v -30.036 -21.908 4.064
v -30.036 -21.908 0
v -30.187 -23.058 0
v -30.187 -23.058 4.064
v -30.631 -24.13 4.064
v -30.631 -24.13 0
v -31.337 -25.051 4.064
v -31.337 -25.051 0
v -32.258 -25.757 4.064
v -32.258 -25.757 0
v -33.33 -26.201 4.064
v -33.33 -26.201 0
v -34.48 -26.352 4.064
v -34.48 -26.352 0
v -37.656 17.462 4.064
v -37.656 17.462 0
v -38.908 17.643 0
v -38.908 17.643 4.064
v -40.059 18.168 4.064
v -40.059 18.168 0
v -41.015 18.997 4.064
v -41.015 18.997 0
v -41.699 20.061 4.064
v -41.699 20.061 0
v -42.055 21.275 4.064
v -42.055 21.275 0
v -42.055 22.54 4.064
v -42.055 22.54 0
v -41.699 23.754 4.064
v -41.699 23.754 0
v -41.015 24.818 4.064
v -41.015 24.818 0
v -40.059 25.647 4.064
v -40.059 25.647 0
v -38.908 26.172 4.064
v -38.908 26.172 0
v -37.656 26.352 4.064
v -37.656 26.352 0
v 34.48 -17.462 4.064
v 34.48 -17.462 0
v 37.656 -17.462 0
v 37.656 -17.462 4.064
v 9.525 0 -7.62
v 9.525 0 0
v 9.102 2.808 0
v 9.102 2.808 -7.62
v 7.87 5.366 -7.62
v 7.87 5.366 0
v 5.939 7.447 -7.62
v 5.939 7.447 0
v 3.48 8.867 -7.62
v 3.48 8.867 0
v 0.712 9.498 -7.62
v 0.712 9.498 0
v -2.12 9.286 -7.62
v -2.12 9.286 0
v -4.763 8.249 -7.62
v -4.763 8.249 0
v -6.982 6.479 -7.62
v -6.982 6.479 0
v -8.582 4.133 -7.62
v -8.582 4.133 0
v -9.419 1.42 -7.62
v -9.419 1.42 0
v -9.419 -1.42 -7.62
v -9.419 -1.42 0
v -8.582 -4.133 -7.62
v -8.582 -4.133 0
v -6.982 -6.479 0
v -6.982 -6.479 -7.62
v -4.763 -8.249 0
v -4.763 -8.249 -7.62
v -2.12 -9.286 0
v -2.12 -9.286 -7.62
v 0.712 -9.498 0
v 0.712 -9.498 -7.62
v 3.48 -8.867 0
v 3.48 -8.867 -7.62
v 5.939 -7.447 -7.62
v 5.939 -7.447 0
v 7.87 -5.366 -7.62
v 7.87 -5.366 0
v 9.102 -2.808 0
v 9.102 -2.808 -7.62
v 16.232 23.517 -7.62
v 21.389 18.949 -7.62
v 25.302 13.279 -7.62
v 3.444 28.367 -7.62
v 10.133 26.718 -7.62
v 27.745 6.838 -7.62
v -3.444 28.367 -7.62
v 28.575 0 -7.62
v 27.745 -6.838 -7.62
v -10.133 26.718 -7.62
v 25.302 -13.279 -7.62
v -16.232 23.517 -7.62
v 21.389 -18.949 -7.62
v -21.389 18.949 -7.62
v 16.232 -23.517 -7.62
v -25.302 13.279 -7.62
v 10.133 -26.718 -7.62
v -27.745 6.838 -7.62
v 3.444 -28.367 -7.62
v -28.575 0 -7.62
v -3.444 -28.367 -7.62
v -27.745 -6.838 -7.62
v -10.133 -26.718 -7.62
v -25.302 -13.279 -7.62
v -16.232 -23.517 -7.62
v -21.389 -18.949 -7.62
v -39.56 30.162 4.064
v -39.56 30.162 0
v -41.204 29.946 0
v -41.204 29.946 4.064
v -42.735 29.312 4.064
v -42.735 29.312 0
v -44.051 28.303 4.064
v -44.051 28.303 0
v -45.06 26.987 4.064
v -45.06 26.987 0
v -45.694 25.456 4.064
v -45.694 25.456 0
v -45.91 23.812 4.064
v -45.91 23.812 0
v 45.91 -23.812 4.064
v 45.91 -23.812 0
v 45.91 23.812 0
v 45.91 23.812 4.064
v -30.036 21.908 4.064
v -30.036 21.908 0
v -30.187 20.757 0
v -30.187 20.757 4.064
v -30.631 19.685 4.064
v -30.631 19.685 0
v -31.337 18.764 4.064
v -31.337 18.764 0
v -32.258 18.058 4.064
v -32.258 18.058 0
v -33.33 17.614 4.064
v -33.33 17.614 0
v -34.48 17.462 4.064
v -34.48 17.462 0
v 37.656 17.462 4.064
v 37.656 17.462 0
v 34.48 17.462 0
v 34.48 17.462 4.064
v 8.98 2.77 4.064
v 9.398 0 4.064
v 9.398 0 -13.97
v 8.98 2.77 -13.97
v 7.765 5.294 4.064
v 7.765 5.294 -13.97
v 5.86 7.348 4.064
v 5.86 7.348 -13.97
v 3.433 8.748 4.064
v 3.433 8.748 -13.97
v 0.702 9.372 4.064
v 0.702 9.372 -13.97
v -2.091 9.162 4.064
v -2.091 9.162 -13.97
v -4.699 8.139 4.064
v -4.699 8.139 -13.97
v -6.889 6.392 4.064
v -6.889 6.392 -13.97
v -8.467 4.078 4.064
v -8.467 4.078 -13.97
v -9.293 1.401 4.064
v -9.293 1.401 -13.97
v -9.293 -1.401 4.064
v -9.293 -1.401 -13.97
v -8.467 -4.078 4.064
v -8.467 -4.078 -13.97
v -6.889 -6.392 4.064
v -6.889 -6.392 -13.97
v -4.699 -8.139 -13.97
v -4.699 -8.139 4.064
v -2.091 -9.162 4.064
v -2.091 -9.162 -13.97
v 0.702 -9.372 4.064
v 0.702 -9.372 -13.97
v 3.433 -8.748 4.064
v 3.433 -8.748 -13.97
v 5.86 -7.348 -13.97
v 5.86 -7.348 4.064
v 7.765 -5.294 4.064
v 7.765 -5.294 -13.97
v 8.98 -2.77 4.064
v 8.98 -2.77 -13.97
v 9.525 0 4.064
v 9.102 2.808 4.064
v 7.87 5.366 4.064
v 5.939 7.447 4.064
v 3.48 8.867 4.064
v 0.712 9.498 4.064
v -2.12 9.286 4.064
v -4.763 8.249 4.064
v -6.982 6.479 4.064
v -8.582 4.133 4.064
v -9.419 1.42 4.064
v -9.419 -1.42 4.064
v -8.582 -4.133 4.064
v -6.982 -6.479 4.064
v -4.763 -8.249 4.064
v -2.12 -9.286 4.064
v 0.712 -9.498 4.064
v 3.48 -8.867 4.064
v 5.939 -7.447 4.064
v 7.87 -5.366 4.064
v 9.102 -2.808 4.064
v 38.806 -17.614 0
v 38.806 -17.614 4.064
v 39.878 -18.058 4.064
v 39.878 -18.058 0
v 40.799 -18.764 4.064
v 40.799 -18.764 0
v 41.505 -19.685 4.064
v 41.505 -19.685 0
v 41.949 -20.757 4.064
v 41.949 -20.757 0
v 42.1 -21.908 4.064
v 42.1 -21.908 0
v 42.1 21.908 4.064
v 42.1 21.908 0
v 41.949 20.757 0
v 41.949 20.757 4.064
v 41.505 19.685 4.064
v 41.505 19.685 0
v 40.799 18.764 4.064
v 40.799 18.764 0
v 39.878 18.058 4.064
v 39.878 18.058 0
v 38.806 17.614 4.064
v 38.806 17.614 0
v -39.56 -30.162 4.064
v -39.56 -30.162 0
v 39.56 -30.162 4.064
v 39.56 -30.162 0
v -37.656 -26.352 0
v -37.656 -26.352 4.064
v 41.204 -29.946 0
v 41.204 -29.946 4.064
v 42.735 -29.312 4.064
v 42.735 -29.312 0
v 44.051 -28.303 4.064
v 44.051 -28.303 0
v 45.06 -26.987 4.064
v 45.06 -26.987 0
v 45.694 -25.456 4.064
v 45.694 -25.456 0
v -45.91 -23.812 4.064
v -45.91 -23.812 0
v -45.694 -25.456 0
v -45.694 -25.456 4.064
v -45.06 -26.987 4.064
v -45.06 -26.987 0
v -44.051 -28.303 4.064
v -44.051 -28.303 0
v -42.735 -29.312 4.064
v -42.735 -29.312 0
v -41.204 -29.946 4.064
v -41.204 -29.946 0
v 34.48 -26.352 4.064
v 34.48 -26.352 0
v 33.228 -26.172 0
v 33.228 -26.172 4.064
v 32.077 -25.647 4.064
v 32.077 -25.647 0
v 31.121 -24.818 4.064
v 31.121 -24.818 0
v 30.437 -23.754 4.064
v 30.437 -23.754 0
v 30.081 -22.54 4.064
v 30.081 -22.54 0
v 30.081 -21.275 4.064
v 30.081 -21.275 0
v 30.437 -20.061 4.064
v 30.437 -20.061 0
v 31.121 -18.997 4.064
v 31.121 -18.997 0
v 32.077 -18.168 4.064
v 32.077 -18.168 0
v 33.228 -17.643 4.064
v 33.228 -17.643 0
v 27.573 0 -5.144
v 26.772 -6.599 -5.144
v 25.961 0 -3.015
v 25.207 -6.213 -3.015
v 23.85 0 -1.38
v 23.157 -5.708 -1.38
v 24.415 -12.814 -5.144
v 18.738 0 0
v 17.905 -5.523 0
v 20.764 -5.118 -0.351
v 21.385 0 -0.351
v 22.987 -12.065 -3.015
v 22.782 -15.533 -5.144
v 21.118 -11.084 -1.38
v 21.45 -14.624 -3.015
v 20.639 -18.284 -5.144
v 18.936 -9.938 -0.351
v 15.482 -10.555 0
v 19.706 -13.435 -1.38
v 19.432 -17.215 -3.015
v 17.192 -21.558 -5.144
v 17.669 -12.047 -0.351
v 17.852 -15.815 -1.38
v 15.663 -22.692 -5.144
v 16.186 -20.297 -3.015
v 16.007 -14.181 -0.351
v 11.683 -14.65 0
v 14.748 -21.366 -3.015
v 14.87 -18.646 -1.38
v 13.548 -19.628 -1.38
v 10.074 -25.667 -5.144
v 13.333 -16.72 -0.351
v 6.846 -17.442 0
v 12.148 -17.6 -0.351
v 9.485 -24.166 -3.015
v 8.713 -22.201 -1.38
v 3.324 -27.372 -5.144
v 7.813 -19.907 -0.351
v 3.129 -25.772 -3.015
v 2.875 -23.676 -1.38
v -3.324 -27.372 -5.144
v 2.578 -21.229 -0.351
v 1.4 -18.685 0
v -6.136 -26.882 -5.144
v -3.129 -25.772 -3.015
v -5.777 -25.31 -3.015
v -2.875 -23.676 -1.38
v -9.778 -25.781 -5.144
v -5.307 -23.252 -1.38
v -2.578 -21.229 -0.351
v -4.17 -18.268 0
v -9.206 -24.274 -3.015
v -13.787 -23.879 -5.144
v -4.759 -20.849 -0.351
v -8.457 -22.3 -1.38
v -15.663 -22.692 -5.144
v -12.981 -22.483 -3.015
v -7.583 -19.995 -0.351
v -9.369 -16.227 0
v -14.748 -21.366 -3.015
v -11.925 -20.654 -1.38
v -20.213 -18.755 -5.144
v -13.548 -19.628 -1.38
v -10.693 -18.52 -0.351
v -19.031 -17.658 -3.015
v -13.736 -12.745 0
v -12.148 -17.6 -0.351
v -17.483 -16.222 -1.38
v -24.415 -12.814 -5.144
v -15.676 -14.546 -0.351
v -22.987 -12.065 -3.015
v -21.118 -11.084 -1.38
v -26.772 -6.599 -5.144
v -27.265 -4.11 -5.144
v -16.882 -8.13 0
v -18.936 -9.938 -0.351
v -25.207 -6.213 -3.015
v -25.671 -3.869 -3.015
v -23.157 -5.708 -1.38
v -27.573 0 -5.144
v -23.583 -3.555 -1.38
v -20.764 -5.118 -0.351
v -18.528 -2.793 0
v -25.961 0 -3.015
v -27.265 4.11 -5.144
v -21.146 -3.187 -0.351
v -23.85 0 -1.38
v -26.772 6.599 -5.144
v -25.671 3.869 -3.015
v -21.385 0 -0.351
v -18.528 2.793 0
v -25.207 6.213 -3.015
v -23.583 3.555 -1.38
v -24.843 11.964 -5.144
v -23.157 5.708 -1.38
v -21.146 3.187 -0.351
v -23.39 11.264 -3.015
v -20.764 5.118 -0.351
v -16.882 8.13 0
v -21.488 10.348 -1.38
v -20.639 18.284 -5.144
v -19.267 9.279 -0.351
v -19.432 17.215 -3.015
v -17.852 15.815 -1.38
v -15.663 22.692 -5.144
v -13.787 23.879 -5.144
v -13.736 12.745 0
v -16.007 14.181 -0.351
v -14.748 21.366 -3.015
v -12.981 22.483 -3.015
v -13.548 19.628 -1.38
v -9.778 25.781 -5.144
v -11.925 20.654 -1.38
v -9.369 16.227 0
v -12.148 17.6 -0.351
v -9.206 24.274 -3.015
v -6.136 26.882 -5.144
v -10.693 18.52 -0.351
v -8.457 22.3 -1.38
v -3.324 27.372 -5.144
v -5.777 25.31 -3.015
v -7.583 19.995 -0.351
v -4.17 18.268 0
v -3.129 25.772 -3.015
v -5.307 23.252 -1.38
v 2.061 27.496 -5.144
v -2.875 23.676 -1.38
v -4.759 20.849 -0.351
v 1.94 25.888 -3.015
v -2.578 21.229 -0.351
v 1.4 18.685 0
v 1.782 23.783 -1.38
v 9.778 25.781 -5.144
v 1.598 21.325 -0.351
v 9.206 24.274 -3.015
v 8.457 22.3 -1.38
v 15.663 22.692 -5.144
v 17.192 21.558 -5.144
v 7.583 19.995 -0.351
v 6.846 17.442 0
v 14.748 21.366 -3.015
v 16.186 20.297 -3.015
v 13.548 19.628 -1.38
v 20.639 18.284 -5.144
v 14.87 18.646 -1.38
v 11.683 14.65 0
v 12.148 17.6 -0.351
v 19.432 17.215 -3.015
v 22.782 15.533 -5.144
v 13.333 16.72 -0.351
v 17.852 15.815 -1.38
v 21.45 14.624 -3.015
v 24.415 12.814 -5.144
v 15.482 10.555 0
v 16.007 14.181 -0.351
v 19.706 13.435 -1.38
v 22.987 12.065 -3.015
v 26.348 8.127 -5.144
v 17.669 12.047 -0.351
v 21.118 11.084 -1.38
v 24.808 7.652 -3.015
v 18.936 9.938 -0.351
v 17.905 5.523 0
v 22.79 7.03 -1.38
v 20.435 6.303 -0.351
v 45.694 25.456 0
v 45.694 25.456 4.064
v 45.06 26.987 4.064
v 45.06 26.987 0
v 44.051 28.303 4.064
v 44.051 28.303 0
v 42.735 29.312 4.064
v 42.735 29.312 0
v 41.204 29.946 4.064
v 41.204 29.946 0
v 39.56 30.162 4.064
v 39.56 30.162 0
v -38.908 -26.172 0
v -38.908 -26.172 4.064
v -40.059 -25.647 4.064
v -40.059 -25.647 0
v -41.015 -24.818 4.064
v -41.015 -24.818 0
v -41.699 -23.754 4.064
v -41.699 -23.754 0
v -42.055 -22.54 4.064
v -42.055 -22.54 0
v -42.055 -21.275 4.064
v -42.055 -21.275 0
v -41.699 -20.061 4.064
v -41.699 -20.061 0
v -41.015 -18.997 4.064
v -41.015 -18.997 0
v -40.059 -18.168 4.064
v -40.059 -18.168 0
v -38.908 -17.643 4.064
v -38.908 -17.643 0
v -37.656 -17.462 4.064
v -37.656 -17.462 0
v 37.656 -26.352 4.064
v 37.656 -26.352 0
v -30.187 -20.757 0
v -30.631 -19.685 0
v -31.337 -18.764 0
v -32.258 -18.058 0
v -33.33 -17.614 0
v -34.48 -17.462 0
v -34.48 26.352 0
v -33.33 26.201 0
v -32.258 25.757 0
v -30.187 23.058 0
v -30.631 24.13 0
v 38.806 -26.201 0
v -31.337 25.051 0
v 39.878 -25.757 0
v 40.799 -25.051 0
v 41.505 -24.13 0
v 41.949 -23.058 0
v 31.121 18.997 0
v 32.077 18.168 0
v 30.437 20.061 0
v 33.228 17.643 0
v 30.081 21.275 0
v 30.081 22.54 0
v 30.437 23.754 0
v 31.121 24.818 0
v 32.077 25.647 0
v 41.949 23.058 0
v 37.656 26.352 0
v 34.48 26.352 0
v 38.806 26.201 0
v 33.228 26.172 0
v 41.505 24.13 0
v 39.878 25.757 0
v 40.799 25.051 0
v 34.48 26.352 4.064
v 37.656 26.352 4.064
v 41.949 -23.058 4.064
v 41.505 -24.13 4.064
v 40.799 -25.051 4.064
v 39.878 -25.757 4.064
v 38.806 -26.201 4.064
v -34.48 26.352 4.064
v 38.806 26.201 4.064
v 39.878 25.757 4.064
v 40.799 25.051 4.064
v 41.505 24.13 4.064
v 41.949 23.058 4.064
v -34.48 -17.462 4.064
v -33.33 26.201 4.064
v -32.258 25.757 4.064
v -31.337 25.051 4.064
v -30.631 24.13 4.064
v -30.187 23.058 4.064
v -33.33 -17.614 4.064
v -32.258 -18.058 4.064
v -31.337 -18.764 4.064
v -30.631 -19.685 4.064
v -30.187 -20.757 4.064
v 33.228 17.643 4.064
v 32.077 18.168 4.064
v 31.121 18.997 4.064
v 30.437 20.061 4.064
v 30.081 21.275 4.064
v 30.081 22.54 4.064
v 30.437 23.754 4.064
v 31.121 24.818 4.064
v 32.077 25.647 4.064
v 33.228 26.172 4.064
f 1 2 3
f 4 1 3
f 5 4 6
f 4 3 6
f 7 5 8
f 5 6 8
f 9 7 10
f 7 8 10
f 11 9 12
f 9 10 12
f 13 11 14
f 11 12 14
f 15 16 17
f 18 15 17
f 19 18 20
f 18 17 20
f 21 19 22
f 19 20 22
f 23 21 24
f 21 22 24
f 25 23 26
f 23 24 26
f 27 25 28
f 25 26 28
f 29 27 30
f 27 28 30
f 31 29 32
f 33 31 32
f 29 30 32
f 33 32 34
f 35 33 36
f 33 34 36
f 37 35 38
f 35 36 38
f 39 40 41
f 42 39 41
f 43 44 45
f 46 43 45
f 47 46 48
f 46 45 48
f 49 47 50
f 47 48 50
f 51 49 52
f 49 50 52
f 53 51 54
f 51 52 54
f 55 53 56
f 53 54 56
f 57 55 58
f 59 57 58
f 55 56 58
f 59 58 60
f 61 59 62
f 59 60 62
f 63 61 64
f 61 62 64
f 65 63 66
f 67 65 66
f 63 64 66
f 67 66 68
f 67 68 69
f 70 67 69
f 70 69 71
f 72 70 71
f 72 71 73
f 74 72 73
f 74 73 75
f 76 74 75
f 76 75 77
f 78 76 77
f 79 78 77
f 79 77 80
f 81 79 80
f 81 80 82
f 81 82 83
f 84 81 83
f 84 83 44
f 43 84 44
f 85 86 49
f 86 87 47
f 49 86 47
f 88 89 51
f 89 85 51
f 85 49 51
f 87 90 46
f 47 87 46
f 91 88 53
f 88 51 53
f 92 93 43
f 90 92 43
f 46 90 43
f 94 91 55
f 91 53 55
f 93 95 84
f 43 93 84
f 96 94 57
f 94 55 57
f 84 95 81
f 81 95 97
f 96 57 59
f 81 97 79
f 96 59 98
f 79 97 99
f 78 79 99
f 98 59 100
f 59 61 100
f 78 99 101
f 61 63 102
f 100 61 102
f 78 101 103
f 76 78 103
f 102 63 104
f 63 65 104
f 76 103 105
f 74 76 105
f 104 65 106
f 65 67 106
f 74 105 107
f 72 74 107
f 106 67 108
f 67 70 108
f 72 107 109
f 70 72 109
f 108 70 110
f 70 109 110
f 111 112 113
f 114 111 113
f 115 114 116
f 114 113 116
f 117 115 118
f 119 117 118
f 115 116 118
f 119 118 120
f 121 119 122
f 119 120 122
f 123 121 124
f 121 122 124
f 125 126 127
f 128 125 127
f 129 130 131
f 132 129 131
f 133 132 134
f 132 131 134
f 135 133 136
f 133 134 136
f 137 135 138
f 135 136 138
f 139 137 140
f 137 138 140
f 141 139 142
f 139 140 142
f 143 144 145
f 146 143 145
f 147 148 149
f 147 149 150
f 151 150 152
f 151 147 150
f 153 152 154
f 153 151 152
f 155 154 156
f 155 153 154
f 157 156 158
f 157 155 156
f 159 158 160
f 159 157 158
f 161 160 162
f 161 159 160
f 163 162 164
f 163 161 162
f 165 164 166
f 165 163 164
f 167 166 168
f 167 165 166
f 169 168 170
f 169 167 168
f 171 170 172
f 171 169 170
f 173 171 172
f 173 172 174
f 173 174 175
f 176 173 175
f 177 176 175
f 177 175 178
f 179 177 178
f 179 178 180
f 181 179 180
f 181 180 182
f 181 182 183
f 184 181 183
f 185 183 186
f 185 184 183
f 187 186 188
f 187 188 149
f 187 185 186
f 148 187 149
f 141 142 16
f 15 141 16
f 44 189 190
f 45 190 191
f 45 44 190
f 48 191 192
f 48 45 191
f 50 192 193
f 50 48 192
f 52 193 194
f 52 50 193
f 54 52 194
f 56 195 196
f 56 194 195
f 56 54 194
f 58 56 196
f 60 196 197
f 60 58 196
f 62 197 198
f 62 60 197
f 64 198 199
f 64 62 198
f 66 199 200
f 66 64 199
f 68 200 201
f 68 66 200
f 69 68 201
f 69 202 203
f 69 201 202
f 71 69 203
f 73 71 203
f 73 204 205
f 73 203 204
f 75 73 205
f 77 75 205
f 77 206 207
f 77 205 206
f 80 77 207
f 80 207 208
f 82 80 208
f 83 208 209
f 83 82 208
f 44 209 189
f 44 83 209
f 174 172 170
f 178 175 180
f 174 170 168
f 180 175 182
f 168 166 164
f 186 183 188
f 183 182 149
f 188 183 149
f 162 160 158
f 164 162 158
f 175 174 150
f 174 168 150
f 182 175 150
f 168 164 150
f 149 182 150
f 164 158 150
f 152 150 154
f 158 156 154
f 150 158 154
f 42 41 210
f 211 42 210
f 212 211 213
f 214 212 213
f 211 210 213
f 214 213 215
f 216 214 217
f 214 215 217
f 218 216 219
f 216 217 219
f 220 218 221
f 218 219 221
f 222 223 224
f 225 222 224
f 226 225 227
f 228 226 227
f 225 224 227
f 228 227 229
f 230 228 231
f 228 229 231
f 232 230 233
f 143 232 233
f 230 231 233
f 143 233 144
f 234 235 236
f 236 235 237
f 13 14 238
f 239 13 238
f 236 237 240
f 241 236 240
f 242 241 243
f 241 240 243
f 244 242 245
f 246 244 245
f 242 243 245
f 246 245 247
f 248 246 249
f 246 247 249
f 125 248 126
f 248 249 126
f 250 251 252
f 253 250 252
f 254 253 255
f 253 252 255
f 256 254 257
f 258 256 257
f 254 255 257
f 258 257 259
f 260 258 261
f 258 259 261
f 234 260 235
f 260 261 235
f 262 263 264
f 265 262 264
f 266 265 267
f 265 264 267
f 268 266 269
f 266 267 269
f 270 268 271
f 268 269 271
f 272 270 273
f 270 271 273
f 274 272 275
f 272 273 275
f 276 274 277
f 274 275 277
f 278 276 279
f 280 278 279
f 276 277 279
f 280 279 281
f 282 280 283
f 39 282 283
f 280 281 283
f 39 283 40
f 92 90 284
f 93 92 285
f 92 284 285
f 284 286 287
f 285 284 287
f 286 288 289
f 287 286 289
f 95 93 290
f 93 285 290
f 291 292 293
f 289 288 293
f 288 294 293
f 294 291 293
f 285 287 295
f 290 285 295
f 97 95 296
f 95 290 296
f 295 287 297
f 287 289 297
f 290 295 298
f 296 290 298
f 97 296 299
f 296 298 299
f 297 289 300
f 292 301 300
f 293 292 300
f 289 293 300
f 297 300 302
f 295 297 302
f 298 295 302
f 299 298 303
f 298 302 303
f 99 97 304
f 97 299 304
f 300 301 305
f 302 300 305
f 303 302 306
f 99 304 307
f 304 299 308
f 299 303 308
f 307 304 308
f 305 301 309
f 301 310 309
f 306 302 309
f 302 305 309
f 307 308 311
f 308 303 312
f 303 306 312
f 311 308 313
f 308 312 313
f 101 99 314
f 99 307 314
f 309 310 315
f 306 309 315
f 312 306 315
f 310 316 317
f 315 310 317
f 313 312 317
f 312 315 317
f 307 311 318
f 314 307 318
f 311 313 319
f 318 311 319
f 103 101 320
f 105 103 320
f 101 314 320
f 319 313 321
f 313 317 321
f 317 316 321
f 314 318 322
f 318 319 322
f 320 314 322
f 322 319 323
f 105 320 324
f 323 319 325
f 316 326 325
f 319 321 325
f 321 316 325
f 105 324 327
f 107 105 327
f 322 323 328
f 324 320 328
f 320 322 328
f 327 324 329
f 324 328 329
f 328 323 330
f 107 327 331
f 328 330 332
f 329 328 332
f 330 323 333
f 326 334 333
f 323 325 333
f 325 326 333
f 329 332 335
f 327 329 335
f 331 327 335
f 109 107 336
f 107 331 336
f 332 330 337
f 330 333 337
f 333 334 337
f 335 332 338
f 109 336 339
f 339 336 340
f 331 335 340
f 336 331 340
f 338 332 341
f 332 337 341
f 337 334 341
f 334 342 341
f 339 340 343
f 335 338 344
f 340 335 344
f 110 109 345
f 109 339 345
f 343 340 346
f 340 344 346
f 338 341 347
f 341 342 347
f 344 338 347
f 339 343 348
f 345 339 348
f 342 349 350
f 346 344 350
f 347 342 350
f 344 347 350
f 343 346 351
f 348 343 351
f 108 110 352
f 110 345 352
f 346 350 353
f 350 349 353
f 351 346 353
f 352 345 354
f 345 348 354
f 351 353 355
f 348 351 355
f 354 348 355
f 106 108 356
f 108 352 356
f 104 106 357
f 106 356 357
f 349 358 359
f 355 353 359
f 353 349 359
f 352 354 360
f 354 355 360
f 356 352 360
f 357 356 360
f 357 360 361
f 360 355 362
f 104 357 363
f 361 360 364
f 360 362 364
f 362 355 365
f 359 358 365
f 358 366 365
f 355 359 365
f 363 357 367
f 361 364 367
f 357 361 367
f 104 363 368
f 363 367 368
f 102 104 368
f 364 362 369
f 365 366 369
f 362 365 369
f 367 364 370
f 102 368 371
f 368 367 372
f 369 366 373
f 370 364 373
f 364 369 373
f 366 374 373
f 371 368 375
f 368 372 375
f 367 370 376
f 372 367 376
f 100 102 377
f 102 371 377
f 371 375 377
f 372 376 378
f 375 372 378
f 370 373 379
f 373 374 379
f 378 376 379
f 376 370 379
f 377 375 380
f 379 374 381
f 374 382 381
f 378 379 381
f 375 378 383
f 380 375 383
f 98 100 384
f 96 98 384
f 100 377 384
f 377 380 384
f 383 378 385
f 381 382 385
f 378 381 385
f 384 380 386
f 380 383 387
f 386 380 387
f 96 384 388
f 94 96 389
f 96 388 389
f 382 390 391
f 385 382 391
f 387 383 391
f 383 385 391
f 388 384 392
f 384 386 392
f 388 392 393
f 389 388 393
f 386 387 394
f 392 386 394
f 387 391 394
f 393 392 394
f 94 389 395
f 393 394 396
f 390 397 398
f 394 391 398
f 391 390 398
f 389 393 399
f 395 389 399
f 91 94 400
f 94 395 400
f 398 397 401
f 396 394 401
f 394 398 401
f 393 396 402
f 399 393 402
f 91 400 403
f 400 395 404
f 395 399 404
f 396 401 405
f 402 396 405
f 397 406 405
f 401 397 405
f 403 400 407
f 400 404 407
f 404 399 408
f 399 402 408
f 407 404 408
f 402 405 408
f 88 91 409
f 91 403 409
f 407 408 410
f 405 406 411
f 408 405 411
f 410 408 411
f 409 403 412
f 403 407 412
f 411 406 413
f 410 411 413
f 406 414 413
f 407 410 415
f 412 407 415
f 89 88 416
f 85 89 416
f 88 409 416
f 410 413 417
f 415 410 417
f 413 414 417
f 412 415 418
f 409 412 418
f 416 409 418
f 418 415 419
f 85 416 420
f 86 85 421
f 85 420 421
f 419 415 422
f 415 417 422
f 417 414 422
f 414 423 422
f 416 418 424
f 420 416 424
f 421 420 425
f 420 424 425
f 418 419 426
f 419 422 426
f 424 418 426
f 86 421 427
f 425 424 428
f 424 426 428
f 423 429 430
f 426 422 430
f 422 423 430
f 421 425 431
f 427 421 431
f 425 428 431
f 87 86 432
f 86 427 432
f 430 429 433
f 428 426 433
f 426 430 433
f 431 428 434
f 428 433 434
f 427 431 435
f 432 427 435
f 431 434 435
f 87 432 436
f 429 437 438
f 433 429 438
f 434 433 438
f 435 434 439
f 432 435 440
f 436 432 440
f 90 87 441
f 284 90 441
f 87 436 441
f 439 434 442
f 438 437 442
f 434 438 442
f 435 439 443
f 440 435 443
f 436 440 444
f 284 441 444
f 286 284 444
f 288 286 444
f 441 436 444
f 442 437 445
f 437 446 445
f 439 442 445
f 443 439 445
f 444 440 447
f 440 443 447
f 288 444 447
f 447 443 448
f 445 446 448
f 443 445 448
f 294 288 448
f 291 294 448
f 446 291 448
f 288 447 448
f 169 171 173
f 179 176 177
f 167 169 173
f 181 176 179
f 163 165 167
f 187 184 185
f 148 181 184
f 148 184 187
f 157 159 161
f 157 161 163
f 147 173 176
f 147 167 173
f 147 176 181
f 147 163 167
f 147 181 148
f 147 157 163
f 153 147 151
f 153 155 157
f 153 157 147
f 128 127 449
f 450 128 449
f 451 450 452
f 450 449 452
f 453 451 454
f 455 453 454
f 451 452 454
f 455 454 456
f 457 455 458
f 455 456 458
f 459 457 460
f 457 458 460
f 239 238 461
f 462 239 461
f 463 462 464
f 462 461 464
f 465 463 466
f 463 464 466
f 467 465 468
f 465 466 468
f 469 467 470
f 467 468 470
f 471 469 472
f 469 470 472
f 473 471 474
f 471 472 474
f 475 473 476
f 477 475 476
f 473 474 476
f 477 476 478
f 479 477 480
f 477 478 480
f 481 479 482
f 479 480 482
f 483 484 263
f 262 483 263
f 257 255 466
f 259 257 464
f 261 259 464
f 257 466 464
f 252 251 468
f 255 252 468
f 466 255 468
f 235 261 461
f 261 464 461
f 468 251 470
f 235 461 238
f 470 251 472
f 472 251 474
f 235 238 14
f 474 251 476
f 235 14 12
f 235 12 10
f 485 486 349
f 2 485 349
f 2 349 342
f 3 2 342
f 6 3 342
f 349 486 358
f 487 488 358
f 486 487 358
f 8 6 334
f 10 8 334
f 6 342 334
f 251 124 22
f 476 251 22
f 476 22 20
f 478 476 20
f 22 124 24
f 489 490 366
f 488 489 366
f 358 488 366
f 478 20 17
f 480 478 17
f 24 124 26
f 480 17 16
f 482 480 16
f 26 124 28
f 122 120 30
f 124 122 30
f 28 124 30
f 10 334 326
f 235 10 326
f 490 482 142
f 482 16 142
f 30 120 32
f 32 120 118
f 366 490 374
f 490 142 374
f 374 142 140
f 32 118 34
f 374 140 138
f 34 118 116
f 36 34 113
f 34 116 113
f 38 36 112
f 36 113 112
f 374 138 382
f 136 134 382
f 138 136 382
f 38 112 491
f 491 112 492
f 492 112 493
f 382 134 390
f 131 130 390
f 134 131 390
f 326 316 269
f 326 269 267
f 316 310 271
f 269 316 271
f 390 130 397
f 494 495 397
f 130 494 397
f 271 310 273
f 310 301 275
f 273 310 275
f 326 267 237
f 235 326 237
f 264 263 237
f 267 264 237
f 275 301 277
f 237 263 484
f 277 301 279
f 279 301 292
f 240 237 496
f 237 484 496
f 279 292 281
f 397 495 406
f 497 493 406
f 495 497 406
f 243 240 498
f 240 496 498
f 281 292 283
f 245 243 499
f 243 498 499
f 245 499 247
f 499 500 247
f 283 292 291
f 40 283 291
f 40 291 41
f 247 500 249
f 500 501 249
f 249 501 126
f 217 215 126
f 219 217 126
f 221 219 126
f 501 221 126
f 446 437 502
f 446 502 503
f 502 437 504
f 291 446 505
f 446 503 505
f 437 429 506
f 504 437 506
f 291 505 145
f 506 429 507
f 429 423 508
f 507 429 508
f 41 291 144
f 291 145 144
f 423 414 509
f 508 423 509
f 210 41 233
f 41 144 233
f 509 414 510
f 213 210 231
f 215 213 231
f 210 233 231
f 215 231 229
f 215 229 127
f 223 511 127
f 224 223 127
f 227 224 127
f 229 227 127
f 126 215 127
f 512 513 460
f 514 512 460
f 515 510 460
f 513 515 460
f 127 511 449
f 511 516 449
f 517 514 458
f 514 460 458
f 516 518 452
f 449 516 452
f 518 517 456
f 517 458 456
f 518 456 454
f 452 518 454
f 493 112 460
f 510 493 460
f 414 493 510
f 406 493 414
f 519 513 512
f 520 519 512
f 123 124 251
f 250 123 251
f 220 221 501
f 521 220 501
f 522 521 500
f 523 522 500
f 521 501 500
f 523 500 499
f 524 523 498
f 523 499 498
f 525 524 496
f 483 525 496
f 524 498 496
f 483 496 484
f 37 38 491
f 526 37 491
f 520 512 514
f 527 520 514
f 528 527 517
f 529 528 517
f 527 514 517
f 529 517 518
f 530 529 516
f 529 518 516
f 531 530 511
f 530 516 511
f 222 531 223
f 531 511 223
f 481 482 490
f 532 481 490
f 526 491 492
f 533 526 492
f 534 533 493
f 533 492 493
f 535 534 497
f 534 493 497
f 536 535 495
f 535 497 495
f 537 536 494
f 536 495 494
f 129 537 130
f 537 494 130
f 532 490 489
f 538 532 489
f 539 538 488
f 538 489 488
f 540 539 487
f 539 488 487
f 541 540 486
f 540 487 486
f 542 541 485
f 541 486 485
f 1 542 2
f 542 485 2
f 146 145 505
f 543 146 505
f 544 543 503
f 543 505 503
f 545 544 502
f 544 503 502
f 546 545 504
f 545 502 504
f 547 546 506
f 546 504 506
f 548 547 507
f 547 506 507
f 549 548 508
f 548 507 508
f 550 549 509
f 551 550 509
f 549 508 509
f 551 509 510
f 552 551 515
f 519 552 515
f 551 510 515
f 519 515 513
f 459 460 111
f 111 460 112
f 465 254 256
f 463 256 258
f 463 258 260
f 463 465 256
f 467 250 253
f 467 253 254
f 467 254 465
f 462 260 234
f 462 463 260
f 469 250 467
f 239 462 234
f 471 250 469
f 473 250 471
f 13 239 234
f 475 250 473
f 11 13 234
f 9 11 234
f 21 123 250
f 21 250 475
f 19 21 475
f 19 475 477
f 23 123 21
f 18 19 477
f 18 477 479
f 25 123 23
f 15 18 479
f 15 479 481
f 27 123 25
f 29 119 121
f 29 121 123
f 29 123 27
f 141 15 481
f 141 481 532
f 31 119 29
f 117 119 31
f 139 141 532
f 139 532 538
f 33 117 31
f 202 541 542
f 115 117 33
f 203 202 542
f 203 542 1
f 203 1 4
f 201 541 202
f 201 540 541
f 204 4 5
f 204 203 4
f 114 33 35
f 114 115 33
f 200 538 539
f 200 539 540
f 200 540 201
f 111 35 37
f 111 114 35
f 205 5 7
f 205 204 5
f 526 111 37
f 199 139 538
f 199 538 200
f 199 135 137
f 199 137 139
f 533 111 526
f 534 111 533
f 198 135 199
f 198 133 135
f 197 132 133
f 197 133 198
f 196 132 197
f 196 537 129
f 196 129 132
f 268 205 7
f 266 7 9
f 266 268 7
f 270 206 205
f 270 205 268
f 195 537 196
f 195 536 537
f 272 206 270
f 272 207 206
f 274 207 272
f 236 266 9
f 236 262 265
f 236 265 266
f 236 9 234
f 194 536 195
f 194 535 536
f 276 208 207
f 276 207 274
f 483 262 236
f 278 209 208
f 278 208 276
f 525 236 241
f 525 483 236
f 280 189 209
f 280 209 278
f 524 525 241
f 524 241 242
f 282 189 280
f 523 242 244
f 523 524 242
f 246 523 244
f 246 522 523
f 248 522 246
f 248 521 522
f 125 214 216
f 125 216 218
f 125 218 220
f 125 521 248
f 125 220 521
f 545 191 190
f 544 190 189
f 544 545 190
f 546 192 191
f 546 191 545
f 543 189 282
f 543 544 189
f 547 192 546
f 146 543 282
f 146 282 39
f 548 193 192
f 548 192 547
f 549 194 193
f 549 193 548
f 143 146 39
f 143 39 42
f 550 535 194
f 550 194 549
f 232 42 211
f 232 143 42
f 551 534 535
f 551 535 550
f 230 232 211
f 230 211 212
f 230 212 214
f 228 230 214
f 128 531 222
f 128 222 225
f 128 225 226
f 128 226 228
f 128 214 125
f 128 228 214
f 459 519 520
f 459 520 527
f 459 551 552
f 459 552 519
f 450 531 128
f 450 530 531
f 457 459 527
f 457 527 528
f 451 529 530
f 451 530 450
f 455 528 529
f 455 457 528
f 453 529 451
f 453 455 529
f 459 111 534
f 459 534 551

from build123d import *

# Parameters (mm, degrees)
F1_DEPTH      = 4.064
F4_R          = 9.525
F5_DEPTH      = 7.621
F5_DEPTH_BACK = 4.065
F6_R          = 9.398
F8_DEPTH      = 18.034


with BuildPart() as f1:
    # F0 (on Top) → F1 (new body)
    with BuildSketch(Plane.XY):
        with BuildLine():
            Line((39.5605, 30.1625), (-39.5605, 30.1625))
            ThreePointArc((-39.5605, 30.1625), (-44.0506280605, 28.3026280605), (-45.9105, 23.8125))
            Line((-45.9105, 23.8125), (-45.9105, -23.8125))
            ThreePointArc((-45.9105, -23.8125), (-44.0506280605, -28.3026280605), (-39.5605, -30.1625))
            Line((-39.5605, -30.1625), (39.5605, -30.1625))
            ThreePointArc((39.5605, -30.1625), (44.0506280605, -28.3026280605), (45.9105, -23.8125))
            Line((45.9105, -23.8125), (45.9105, 23.8125))
            ThreePointArc((45.9105, 23.8125), (44.0506280605, 28.3026280605), (39.5605, 30.1625))
        make_face()
        with BuildLine():
            ThreePointArc((-34.4805, -17.4625), (-31.3374103576, -18.7644103576), (-30.0355, -21.9075))
            ThreePointArc((-30.0355, -21.9075), (-31.3374103576, -25.0505896424), (-34.4805, -26.3525))
            Line((-34.4805, -26.3525), (-37.6555, -26.3525))
            ThreePointArc((-37.6555, -26.3525), (-42.1005, -21.9075), (-37.6555, -17.4625))
            Line((-37.6555, -17.4625), (-34.4805, -17.4625))
        make_face(mode=Mode.SUBTRACT)
        with BuildLine():
            ThreePointArc((34.4805, -26.3525), (30.0355, -21.9075), (34.4805, -17.4625))
            Line((34.4805, -17.4625), (37.6555, -17.4625))
            ThreePointArc((37.6555, -17.4625), (40.7985896424, -18.7644103576), (42.1005, -21.9075))
            ThreePointArc((42.1005, -21.9075), (40.7985896424, -25.0505896424), (37.6555, -26.3525))
            Line((37.6555, -26.3525), (34.4805, -26.3525))
        make_face(mode=Mode.SUBTRACT)
        with BuildLine():
            ThreePointArc((-34.4805, 26.3525), (-31.3374103576, 25.0505896424), (-30.0355, 21.9075))
            ThreePointArc((-30.0355, 21.9075), (-31.3374103576, 18.7644103576), (-34.4805, 17.4625))
            Line((-34.4805, 17.4625), (-37.6555, 17.4625))
            ThreePointArc((-37.6555, 17.4625), (-42.1005, 21.9075), (-37.6555, 26.3525))
            Line((-37.6555, 26.3525), (-34.4805, 26.3525))
        make_face(mode=Mode.SUBTRACT)
        with BuildLine():
            ThreePointArc((37.6555, 26.3525), (40.7985896424, 25.0505896424), (42.1005, 21.9075))
            ThreePointArc((42.1005, 21.9075), (40.7985896424, 18.7644103576), (37.6555, 17.4625))
            Line((37.6555, 17.4625), (34.4805, 17.4625))
            ThreePointArc((34.4805, 17.4625), (30.0355, 21.9075), (34.4805, 26.3525))
            Line((34.4805, 26.3525), (37.6555, 26.3525))
        make_face(mode=Mode.SUBTRACT)
    extrude(amount=F1_DEPTH)

    # F2 (on Front) → F3 (revolve)
    with BuildSketch(Plane.XZ):
        with BuildLine():
            Line((18.7376223006, 0), (0, 0))
            Line((0, 0), (0, -7.62))
            Line((0, -7.62), (28.575, -7.62))
            ThreePointArc((28.575, -7.62), (24.9593262473, -2.1278147432), (18.7376223006, 0))
        make_face()
    revolve(axis=Axis((0, 0, -3.81), (0, 0, -1)))

    # F4 (on Top) → F5 (cut, two sides)
    with BuildSketch(Plane.XY) as f5_sk:
        Circle(F4_R)
    extrude(amount=-F5_DEPTH, mode=Mode.SUBTRACT)
    extrude(f5_sk.sketch, amount=F5_DEPTH_BACK, mode=Mode.SUBTRACT)


with BuildPart() as f8:
    # F6 (on face) → F8 (new body, through all)
    with BuildSketch(Plane.XY.offset(4.064)):
        Circle(F6_R)
    extrude(amount=-F8_DEPTH)


solid = Compound([f1.part, f8.part])
